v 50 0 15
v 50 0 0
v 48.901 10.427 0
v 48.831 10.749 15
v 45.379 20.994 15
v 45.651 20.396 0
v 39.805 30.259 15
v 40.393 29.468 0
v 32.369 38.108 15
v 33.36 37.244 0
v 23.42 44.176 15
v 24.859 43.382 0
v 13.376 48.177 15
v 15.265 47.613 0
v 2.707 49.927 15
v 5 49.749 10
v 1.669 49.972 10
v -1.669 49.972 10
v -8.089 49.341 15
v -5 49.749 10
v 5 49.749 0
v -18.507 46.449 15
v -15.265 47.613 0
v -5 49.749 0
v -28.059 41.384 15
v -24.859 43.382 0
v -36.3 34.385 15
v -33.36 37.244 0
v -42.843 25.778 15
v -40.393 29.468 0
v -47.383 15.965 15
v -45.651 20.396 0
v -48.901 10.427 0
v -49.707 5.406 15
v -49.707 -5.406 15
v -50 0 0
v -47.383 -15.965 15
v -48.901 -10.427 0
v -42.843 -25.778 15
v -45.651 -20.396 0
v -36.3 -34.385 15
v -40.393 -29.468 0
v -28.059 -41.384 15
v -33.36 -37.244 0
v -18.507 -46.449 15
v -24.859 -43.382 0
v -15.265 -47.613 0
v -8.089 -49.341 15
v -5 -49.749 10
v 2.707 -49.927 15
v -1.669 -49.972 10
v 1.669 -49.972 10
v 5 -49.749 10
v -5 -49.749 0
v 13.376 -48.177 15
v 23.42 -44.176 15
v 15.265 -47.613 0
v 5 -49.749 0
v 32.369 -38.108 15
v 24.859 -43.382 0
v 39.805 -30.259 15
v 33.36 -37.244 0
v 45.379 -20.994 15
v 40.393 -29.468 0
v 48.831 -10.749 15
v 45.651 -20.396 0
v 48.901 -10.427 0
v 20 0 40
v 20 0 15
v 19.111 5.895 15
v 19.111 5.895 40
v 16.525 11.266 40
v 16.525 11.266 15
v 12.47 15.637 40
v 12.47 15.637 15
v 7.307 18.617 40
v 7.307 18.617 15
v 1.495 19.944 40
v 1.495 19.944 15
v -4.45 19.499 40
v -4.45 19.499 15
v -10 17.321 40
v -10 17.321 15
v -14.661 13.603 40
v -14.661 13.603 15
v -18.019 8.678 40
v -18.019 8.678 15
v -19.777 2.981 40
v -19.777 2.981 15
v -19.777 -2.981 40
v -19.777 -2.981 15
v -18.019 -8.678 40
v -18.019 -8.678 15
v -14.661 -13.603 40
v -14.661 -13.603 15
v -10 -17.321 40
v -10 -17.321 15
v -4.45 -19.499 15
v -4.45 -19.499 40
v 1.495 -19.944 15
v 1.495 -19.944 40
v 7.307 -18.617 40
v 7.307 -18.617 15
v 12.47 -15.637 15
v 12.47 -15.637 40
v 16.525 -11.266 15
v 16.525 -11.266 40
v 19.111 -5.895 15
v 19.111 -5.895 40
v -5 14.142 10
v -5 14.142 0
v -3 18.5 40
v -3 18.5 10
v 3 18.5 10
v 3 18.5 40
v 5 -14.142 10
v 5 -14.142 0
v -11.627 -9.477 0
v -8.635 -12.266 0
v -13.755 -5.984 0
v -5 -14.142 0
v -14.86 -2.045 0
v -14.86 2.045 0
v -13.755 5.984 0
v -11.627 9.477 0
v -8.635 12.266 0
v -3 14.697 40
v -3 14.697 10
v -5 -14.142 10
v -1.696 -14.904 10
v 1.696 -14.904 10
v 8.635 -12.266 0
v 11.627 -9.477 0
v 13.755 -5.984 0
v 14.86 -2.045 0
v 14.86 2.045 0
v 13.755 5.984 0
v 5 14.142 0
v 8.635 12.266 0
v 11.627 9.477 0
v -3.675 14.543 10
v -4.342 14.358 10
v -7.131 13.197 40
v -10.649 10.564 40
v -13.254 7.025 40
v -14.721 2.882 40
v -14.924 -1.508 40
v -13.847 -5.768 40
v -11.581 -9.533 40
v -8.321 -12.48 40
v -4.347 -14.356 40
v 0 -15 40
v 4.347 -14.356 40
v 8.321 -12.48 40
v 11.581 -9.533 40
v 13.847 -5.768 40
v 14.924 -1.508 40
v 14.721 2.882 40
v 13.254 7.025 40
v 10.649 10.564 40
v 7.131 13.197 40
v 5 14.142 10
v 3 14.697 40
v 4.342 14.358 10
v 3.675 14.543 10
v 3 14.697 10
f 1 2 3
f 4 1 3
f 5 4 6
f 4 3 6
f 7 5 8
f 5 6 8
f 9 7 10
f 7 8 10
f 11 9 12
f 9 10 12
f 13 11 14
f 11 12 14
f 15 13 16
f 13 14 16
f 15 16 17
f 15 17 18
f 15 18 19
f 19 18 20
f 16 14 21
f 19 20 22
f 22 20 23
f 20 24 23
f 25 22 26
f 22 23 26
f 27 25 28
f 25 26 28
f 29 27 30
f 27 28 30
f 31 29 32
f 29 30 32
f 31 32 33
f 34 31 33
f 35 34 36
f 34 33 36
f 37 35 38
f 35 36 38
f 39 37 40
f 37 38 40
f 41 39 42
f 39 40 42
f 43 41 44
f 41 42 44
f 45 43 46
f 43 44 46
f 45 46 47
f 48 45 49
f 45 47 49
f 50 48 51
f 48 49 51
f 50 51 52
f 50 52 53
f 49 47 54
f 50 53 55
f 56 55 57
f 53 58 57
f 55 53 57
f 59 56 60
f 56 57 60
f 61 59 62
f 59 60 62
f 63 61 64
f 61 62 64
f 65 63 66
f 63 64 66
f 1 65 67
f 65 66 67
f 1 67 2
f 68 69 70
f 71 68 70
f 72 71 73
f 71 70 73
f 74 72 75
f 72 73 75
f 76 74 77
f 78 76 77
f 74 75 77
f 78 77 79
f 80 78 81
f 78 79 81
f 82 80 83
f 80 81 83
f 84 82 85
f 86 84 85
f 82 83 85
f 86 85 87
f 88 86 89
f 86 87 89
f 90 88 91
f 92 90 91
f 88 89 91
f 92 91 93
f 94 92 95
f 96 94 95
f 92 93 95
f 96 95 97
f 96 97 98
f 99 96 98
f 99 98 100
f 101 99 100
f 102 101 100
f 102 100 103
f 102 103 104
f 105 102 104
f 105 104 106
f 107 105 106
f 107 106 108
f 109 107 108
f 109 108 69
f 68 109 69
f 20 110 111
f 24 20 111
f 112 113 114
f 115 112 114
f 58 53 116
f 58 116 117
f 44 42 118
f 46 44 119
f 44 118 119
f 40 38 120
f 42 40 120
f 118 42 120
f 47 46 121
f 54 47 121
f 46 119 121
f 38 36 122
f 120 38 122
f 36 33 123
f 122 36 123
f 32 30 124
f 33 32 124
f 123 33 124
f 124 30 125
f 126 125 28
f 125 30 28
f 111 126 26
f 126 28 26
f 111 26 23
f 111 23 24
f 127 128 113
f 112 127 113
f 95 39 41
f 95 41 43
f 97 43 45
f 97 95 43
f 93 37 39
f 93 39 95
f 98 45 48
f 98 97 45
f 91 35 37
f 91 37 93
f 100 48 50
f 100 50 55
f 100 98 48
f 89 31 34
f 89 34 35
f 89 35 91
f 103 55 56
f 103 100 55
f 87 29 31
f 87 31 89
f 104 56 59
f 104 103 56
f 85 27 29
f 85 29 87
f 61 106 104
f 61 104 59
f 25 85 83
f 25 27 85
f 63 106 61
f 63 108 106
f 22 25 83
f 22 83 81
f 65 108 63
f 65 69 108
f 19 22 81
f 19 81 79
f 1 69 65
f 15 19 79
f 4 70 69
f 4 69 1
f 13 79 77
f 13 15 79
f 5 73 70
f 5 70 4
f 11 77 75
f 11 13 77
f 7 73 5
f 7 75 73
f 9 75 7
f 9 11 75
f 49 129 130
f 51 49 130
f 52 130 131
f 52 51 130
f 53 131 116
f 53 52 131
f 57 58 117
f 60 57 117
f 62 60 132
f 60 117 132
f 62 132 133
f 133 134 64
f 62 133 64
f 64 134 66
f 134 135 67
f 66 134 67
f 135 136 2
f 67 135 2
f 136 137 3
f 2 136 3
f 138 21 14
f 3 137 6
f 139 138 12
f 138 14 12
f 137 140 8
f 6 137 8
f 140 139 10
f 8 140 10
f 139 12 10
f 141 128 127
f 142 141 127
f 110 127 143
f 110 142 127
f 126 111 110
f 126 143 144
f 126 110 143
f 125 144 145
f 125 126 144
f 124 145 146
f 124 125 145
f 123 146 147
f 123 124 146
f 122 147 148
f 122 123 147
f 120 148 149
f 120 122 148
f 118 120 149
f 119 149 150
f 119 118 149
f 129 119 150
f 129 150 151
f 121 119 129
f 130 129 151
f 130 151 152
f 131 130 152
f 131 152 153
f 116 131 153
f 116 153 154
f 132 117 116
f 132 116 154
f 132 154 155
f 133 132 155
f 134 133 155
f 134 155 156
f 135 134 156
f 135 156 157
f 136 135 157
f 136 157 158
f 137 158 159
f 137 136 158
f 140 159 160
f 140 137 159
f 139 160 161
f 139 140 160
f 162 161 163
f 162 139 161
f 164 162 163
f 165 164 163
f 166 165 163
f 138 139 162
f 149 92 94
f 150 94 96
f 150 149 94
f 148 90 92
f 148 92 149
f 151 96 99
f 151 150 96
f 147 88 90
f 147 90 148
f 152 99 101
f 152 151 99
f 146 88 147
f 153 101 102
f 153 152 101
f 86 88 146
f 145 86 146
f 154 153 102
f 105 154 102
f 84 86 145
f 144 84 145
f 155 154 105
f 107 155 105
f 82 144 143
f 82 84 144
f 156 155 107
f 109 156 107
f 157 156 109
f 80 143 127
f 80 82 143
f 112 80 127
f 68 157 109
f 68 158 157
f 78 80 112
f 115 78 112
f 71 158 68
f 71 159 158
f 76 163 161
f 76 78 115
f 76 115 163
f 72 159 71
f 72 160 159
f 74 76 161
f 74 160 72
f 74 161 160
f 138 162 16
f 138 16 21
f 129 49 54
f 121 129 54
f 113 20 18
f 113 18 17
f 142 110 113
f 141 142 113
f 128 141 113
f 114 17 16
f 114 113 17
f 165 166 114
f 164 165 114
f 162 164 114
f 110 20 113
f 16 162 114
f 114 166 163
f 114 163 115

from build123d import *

# Parameters (mm, degrees)
SKETCH1_R               = 50
SKETCH1_R_2             = 20
BOSS_EXTRUDE1_DEPTH     = 15
SKETCH1_3_R             = 20
SKETCH1_3_R_2           = 15
BOSS_EXTRUDE2_DEPTH     = 40
SKETCH2_W               = 6
SKETCH2_H               = 4
CUT_EXTRUDE1_DEPTH      = 80
CUT_EXTRUDE2_DEPTH      = 80
CUT_EXTRUDE2_DEPTH_BACK = 80
SKETCH3_W               = 10
SKETCH3_H               = 10


with BuildPart() as part:
    # Sketch1 → Boss-Extrude1 (new body)
    with BuildSketch(Plane.XY):
        Circle(SKETCH1_R)
        Circle(SKETCH1_R_2, mode=Mode.SUBTRACT)
    extrude(amount=BOSS_EXTRUDE1_DEPTH)

    # Sketch1<3> → Boss-Extrude2 (add)
    with BuildSketch(Plane.XY):
        Circle(SKETCH1_3_R)
        Circle(SKETCH1_3_R_2, mode=Mode.SUBTRACT)
    extrude(amount=BOSS_EXTRUDE2_DEPTH)

    # Sketch2 → Cut-Extrude1 (cut)
    with BuildSketch(Plane.XY):
        with Locations((0, 16.5)):
            Rectangle(SKETCH2_W, SKETCH2_H)
    extrude(amount=CUT_EXTRUDE1_DEPTH, mode=Mode.SUBTRACT)

    # Sketch3 → Cut-Extrude2 (cut, two sides: drawn at the far end of the back side and taken through both)
    with BuildSketch(Plane(origin=(0, 0, 0), x_dir=(1, 0, 0), z_dir=(0, 1, 0)).offset(-CUT_EXTRUDE2_DEPTH_BACK)):
        with Locations((0, -5)):
            Rectangle(SKETCH3_W, SKETCH3_H)
    extrude(amount=CUT_EXTRUDE2_DEPTH + CUT_EXTRUDE2_DEPTH_BACK, mode=Mode.SUBTRACT)


solid = part.part
